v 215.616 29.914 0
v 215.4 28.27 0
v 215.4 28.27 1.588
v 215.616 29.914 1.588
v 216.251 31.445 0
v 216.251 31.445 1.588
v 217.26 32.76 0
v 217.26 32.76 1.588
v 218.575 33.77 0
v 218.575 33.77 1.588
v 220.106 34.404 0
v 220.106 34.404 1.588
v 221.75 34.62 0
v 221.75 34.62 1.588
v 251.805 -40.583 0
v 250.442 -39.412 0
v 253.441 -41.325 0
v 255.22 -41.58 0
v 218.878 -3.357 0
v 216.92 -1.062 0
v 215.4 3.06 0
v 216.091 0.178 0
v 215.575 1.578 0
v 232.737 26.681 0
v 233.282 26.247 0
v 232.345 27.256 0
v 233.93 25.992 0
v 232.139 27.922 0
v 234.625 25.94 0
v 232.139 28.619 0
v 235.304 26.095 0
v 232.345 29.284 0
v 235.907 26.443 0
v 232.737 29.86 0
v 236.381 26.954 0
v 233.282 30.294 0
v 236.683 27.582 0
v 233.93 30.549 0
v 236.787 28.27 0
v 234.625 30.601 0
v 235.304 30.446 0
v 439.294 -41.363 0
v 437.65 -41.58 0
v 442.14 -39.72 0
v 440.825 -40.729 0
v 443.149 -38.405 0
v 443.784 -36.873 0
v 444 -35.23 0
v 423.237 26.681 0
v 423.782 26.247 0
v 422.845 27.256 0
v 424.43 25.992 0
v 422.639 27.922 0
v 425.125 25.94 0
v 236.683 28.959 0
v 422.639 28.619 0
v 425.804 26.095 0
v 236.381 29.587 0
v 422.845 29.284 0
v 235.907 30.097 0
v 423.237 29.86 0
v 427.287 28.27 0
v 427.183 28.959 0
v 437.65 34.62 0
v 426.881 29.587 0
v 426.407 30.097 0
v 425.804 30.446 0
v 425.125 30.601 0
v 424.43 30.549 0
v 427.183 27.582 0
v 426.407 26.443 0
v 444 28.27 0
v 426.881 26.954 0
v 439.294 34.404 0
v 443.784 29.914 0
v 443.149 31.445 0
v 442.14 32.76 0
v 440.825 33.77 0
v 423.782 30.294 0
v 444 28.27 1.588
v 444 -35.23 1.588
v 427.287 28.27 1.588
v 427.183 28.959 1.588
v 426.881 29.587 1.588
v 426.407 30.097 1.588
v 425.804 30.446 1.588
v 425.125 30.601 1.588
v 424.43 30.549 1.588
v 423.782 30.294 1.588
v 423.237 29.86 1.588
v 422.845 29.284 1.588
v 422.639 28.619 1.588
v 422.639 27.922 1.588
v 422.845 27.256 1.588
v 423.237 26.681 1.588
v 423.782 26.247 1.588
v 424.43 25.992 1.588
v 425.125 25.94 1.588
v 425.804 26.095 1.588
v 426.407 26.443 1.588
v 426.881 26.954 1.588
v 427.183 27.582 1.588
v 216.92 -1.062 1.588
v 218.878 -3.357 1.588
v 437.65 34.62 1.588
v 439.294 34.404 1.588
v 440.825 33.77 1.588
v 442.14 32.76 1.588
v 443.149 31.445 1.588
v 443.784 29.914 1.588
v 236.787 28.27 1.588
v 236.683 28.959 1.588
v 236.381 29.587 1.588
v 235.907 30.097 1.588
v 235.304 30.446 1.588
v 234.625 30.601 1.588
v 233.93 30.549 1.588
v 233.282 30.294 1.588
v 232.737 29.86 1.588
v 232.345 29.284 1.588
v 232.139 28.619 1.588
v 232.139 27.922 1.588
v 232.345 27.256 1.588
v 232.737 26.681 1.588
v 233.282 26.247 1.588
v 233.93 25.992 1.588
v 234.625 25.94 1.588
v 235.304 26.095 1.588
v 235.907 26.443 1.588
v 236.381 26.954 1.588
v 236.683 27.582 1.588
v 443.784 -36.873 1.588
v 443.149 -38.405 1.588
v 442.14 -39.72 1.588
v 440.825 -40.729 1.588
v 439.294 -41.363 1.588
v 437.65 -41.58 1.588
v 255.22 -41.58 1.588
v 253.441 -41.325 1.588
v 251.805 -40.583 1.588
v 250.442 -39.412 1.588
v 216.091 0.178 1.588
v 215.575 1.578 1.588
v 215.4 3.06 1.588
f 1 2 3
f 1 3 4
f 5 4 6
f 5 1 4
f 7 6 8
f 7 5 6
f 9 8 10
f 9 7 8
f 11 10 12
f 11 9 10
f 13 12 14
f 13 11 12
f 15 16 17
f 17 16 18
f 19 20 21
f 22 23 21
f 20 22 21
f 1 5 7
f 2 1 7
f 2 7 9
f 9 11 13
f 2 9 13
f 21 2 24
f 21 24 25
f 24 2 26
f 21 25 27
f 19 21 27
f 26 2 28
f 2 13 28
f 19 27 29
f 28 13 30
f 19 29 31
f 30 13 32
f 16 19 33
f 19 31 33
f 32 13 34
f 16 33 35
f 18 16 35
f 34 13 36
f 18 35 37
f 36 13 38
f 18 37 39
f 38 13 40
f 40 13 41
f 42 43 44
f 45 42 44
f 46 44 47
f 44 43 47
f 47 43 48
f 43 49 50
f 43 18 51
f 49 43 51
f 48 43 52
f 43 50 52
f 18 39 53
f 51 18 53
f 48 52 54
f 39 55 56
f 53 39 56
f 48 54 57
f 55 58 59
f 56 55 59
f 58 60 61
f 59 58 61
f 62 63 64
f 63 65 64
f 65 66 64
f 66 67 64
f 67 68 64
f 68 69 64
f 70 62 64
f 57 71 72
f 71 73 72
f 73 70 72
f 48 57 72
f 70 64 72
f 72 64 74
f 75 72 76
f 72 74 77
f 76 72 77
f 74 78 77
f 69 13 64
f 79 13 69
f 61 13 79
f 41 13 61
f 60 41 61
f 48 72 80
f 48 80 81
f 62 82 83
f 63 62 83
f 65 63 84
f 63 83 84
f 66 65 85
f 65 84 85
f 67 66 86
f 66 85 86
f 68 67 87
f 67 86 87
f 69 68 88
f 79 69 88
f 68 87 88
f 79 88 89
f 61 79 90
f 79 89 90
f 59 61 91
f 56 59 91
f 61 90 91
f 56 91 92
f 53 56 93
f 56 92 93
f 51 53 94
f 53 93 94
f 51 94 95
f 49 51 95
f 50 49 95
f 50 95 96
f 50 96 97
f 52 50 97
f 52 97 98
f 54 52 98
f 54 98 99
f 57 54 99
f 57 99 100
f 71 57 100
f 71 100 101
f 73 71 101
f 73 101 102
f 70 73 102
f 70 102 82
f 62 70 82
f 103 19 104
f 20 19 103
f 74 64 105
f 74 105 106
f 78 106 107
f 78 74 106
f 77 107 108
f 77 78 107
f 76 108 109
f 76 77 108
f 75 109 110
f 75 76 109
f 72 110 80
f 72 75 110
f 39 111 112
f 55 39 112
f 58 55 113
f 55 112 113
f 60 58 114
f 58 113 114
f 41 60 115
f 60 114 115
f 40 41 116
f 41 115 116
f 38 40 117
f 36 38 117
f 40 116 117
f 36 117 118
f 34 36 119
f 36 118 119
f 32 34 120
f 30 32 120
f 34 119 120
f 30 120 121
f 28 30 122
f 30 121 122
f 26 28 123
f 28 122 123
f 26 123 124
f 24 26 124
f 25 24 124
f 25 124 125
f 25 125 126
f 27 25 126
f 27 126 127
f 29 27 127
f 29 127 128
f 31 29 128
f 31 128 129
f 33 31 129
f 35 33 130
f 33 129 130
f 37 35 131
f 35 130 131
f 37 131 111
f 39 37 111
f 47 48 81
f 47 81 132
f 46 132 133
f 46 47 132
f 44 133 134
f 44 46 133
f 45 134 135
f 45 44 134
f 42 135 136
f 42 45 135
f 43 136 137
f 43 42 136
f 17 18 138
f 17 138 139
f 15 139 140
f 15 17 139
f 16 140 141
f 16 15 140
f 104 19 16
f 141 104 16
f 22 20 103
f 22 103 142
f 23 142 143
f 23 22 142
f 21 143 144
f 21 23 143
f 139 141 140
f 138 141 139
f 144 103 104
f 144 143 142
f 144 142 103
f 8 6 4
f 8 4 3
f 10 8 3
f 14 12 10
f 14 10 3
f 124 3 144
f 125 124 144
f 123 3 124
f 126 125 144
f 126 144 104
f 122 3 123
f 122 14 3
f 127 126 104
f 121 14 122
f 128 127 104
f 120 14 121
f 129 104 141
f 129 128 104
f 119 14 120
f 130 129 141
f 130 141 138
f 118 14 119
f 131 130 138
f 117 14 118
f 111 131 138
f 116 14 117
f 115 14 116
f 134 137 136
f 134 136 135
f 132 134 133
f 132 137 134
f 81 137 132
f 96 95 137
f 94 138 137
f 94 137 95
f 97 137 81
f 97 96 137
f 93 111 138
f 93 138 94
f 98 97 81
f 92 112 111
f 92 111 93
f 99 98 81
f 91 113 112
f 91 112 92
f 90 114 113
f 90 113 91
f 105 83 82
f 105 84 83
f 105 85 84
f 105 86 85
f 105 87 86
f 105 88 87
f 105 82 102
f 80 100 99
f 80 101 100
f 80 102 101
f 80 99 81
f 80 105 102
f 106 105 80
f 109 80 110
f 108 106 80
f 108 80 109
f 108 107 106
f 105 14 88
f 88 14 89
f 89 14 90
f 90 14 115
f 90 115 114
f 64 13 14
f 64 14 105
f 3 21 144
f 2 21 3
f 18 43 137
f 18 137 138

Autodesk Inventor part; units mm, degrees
ref_plane "YZ Plane" through (0, 0, 0) normal (1, 0, 0) x (0, 1, 0)
ref_plane "XZ Plane" through (0, 0, 0) normal (0, 1, 0) x (-1, 0, 0)
ref_plane "Work Plane1" through (0, 0, 0) normal (0, 0, 1) x (1, 0, 0)
sketch "Sketch1" plane through (0, 0, 0) normal (0, 0, 1) x (1, 0, 0)
  circle A0 centre (228.1, 21.9203) radius 2.3114
  circle A1 centre (431.3, 21.9203) radius 2.3114
  line L0 (318.0242, 34.6203) -> (379.4758, 34.6203)
  line L1 (215.4, 19.6089) -> (215.4, 11.6079)
  line L2 (444, 9.2203) -> (444, 11.6079)
  line L3 (221.75, 34.6203) -> (437.65, 34.6203)
  line L4 (444, 28.2703) -> (444, -35.2297)
  line L5 (437.65, -41.5797) -> (255.2197, -41.5797)
  line L6 (215.4, 3.0597) -> (215.4, 28.2703)
  line L7 (190.0994, 1.6338) -> (231.0454, -48.1215) construction
  arc A2 (437.65, -41.5797) -> (444, -35.2297) centre (437.65, -35.2297) ccw
  arc A3 (221.75, 34.6203) -> (215.4, 28.2703) centre (221.75, 28.2703) ccw
  arc A4 (444, 28.2703) -> (437.65, 34.6203) centre (437.65, 28.2703) ccw
  line L8 (218.8779, -3.3569) -> (250.4419, -39.4124)
  line L9 (218.8779, -3.3569) -> (216.9197, -1.0623)
  arc A5 (250.4419, -39.4124) -> (255.2197, -41.5797) centre (255.2197, -35.2297) ccw
  arc A6 (215.4, 3.0597) -> (216.9197, -1.0623) centre (221.75, 3.0597) ccw
  point P0 (0, 0)
  point P1 (444, -41.5797)
  point P2 (444, 34.6203)
  point P3 (444, 10.4141)
  point P4 (215.4, 15.6084)
  point P5 (379.4758, 34.6203)
  point P6 (252.3392, -41.5797)
  dimension "d0" = 76.2
  dimension "d1" = 0
  dimension "d3" = 0
  dimension "d5" = 6.35
  dimension "d6" = 6.35
  dimension "d19" = 50.8
  dimension "d21" = 6.35
extrude "Plate1" add sketch "Sketch1" along normal blind 1.5875
sketch "Sketch5" plane through (221.75, 34.6203, 1.5875) normal (0, 0, 1) x (1, 0, 0)
  circle A0 centre (6.35, -12.7) radius 2.3114 projected
  circle A1 centre (12.7, -6.35) radius 2.3368
  circle A2 centre (19.05, -12.7) radius 1.5652 construction
  point P0 (-221.75, -34.6203)
  dimension "d22" = 4.6736
  dimension "d31" = 12.7
  dimension "d32" = 6.35
  dimension "d33" = -6.35
sheet face with bend "Face2" sketch "Sketch5" thickness 1.5875 toward (0, 0, -1) bend radius 1.5875 contours A0
bend "Bend1"
extrude "Cut1" cut sketch "Sketch5" against normal blind 1.5875 contours A1
sketch "Sketch6" plane through (0, 0, 1.5875) normal (0, 0, 1) x (1, 0, 0)
  circle A0 centre (424.95, 28.2703) radius 2.3368
  circle A1 centre (418.6, 21.9203) radius 1.1969 construction
  circle A2 centre (431.3, 21.9203) radius 2.3114 projected
  point P0 (0, 0)
  dimension "d34" = 4.6736
  dimension "d35" = 6.35
  dimension "d36" = 0
  dimension "d37" = 12.7
  dimension "d38" = 6.35
sheet face with bend "Face3" sketch "Sketch6" thickness 1.5875 toward (0, 0, -1) bend radius 1.5875 contours A2
bend "Bend2"
extrude "Cut2" cut sketch "Sketch6" against normal blind 1.5875 contours A0
equation "\"d29\" = Thickness"
equation "\"d44\" = Thickness"
equation "\"d7\" = Thickness"
equation "\"d24\" = BendRadius"
equation "\"d25\" = BendReliefWidth"
equation "\"d27\" = MinimumRemnant"
equation "\"d26\" = BendReliefDepth"
equation "\"d28\" = TransitionRadius"
equation "\"d39\" = BendRadius"
equation "\"d40\" = BendReliefWidth"
equation "\"d42\" = MinimumRemnant"
equation "\"d41\" = BendReliefDepth"
equation "\"d43\" = TransitionRadius"
equation "\"BendRadius\" = Thickness"
equation "\"BendReliefWidth\" = Thickness"
equation "\"BendReliefDepth\" = 0.5 * Thickness"
equation "\"CornerReliefSize\" = 4 * Thickness"
equation "\"MinimumRemnant\" = 2 * Thickness"
equation "\"TransitionRadius\" = BendRadius"
equation "\"JacobiRadiusSize\" = BendRadius"
equation "\"GapSize\" = Thickness"
equation "\"Thickness\" = 1.5875"
properties part number "wingpoly"
